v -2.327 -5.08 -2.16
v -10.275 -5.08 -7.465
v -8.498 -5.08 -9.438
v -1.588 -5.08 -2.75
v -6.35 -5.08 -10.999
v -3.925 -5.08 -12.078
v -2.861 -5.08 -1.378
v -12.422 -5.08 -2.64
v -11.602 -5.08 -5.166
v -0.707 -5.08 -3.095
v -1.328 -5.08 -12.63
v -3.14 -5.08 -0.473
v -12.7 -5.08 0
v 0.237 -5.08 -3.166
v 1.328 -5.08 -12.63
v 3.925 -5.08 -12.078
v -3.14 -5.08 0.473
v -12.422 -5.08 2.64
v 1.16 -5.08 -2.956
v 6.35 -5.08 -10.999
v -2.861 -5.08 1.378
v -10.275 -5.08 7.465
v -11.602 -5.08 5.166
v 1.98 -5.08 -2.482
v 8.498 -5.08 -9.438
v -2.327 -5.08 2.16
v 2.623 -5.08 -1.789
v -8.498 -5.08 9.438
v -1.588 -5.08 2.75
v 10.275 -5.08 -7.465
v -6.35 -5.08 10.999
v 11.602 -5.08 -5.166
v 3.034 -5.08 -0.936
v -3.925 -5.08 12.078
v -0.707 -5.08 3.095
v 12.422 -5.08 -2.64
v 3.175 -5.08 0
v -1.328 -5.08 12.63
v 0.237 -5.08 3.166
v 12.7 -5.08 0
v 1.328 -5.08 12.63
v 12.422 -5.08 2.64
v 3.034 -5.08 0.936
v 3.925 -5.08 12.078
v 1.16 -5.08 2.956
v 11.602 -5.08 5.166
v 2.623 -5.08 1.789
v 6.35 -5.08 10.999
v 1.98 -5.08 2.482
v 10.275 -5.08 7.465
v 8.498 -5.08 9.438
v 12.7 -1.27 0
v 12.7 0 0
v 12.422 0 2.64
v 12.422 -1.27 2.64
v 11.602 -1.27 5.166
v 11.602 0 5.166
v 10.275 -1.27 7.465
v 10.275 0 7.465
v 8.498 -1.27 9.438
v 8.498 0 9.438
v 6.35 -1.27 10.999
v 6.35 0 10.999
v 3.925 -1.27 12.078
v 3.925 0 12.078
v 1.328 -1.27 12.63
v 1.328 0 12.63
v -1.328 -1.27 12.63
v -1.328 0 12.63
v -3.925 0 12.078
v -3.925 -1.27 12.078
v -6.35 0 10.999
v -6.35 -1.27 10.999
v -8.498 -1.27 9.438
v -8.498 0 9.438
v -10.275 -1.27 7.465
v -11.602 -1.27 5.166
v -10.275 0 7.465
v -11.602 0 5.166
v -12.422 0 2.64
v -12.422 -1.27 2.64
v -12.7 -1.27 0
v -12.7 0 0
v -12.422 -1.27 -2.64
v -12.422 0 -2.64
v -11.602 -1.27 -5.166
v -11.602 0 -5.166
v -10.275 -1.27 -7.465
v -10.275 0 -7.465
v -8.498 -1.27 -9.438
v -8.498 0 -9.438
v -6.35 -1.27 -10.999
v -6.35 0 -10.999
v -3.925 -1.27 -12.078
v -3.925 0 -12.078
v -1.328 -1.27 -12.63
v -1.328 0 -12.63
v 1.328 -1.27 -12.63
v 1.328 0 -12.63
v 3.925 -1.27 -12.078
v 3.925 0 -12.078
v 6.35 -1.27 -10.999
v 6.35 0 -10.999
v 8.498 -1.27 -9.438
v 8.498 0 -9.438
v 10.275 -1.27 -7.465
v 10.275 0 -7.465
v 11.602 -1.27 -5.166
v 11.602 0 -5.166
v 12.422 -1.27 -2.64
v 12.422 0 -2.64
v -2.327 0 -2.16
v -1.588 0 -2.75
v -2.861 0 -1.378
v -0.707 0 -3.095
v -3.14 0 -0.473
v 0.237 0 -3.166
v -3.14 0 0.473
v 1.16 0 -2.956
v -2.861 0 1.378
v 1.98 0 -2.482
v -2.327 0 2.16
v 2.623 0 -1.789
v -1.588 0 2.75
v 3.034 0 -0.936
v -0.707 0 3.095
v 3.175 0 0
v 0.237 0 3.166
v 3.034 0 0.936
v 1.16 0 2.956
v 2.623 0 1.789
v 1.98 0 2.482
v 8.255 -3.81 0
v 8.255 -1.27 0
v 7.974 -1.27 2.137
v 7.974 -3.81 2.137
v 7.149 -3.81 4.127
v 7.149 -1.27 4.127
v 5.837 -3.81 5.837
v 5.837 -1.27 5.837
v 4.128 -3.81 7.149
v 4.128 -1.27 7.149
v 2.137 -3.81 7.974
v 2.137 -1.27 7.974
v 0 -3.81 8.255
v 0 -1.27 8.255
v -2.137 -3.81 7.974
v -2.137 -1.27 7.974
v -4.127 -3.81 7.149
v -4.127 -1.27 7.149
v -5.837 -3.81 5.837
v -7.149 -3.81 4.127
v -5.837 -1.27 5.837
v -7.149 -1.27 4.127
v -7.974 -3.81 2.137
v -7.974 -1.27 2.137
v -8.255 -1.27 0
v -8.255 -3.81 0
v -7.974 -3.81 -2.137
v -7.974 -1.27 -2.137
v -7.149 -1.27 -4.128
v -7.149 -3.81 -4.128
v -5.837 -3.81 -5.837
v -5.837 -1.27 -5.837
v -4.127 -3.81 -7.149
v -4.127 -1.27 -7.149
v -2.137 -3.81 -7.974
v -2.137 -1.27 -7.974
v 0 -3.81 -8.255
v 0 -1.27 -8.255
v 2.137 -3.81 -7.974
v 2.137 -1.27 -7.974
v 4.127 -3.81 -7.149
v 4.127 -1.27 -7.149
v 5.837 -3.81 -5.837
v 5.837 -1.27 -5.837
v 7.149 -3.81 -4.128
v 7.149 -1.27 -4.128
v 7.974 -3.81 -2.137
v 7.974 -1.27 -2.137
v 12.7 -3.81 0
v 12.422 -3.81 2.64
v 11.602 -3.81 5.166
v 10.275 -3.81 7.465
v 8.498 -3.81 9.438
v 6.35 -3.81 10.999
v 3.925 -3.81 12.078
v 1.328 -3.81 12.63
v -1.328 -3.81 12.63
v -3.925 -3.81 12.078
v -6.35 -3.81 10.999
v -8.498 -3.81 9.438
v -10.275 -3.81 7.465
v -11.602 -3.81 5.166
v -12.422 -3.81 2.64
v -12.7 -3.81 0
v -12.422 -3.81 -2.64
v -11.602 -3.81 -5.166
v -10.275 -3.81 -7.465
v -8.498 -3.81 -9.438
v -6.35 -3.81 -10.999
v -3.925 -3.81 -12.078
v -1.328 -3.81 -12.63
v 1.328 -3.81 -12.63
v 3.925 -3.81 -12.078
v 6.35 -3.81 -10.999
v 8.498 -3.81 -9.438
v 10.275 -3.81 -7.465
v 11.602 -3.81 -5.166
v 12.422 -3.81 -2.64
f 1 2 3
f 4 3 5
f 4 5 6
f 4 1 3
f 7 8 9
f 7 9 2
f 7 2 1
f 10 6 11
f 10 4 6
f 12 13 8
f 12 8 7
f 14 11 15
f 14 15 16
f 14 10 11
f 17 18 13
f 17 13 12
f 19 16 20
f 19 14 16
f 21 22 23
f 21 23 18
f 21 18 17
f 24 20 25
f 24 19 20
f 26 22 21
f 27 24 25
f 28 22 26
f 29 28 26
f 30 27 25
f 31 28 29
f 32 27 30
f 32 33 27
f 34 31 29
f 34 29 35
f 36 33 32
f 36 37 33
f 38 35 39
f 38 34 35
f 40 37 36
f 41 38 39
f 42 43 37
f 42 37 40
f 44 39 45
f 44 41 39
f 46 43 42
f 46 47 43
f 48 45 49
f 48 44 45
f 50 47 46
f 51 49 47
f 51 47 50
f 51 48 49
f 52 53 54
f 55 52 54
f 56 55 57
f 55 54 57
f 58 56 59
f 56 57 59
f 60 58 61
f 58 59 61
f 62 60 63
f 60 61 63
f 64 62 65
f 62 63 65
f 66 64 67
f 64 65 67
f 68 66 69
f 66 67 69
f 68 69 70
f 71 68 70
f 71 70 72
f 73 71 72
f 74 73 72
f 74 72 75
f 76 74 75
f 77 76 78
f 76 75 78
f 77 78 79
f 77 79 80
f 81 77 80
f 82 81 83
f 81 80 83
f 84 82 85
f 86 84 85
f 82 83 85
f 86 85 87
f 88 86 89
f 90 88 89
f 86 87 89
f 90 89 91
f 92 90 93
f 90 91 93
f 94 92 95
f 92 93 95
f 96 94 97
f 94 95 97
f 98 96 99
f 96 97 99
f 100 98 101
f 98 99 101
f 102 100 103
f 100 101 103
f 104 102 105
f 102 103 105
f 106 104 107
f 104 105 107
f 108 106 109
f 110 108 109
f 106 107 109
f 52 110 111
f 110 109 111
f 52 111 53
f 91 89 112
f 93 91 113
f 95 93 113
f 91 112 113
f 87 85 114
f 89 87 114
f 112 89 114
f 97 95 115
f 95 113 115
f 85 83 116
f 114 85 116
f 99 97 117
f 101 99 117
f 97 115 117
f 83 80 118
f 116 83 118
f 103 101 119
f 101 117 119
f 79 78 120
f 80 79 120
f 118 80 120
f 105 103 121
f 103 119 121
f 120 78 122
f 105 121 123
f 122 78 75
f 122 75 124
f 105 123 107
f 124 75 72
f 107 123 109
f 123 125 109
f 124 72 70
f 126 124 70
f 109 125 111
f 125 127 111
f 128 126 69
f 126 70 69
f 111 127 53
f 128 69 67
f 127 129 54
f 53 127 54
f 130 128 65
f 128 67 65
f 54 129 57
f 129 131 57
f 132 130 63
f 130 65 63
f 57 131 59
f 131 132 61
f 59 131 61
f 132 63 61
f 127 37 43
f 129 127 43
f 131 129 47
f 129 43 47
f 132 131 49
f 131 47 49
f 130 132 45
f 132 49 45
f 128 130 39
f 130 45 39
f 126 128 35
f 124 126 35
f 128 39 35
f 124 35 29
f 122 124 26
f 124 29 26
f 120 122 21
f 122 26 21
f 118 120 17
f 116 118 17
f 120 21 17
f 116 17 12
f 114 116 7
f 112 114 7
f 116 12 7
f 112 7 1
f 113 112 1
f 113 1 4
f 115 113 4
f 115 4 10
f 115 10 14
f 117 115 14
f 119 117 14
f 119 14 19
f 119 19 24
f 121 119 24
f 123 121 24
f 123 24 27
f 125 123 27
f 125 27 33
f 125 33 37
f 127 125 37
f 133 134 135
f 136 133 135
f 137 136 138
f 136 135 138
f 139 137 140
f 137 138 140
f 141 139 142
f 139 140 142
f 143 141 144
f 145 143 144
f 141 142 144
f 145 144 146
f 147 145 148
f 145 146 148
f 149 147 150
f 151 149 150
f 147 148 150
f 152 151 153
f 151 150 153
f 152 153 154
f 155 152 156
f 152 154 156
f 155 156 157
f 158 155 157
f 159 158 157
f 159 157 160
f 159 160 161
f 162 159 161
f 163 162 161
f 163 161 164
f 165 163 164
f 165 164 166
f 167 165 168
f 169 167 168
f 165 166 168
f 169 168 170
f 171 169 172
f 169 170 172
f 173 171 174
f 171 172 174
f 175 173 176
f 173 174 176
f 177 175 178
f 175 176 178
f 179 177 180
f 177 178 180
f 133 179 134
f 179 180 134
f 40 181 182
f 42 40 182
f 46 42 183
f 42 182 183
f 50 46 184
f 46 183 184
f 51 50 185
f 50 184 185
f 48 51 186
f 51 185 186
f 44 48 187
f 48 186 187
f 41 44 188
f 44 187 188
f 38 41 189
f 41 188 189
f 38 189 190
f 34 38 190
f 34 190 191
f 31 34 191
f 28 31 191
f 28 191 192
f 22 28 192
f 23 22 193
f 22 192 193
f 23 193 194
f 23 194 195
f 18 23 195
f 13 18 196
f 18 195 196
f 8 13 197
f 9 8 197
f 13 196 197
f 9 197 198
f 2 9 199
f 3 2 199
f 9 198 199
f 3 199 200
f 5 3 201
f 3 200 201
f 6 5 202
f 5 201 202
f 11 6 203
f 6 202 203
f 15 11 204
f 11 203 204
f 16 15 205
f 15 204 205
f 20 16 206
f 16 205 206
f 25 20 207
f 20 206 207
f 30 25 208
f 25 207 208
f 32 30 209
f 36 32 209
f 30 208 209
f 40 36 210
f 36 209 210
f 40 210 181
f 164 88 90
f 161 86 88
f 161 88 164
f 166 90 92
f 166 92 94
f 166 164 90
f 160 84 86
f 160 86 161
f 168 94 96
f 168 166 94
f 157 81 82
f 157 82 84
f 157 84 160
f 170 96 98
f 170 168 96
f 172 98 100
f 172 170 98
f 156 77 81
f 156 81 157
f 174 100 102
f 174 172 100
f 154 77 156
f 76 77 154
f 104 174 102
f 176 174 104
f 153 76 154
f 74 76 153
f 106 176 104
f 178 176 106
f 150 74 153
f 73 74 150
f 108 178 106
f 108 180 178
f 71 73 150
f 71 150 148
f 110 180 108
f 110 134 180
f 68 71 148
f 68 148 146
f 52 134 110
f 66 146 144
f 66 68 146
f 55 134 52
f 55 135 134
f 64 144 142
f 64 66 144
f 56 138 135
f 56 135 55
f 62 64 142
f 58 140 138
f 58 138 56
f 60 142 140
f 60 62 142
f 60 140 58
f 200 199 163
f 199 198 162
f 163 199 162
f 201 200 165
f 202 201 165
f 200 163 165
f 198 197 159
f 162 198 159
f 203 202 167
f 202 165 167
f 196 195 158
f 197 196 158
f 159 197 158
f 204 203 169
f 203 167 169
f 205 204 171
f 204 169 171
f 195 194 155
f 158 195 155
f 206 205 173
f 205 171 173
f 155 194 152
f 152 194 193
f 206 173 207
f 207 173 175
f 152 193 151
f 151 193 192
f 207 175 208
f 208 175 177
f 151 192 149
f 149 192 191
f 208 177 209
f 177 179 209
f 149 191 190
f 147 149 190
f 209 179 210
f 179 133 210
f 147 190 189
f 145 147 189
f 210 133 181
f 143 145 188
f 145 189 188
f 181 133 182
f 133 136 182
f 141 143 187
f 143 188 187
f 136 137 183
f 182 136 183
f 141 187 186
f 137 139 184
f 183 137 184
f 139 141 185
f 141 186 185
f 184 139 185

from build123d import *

# Parameters (mm, degrees)
F0_R     = 12.7
F1_DEPTH = 1.27
F2_R     = 8.255
F3_DEPTH = 2.54
F4_R     = 12.7
F5_DEPTH = 1.27
F6_R     = 3.175
F7_DEPTH = 25.4


with BuildPart() as f1:
    # F0 (on Front) → F1 (new body)
    with BuildSketch(Plane.XZ):
        Circle(F0_R)
    extrude(amount=F1_DEPTH)

    # F2 (on face) → F3 (join)
    with BuildSketch(Plane.XZ.offset(1.27)):
        Circle(F2_R)
    extrude(amount=F3_DEPTH)

    # F4 (on face) → F5 (join)
    with BuildSketch(Plane.XZ.offset(3.81)):
        Circle(F4_R)
    extrude(amount=F5_DEPTH)

    # F6 (on face) → F7 (cut)
    with BuildSketch(Plane.XZ.offset(5.08)):
        Circle(F6_R)
    extrude(amount=-F7_DEPTH, mode=Mode.SUBTRACT)


solid = f1.part
